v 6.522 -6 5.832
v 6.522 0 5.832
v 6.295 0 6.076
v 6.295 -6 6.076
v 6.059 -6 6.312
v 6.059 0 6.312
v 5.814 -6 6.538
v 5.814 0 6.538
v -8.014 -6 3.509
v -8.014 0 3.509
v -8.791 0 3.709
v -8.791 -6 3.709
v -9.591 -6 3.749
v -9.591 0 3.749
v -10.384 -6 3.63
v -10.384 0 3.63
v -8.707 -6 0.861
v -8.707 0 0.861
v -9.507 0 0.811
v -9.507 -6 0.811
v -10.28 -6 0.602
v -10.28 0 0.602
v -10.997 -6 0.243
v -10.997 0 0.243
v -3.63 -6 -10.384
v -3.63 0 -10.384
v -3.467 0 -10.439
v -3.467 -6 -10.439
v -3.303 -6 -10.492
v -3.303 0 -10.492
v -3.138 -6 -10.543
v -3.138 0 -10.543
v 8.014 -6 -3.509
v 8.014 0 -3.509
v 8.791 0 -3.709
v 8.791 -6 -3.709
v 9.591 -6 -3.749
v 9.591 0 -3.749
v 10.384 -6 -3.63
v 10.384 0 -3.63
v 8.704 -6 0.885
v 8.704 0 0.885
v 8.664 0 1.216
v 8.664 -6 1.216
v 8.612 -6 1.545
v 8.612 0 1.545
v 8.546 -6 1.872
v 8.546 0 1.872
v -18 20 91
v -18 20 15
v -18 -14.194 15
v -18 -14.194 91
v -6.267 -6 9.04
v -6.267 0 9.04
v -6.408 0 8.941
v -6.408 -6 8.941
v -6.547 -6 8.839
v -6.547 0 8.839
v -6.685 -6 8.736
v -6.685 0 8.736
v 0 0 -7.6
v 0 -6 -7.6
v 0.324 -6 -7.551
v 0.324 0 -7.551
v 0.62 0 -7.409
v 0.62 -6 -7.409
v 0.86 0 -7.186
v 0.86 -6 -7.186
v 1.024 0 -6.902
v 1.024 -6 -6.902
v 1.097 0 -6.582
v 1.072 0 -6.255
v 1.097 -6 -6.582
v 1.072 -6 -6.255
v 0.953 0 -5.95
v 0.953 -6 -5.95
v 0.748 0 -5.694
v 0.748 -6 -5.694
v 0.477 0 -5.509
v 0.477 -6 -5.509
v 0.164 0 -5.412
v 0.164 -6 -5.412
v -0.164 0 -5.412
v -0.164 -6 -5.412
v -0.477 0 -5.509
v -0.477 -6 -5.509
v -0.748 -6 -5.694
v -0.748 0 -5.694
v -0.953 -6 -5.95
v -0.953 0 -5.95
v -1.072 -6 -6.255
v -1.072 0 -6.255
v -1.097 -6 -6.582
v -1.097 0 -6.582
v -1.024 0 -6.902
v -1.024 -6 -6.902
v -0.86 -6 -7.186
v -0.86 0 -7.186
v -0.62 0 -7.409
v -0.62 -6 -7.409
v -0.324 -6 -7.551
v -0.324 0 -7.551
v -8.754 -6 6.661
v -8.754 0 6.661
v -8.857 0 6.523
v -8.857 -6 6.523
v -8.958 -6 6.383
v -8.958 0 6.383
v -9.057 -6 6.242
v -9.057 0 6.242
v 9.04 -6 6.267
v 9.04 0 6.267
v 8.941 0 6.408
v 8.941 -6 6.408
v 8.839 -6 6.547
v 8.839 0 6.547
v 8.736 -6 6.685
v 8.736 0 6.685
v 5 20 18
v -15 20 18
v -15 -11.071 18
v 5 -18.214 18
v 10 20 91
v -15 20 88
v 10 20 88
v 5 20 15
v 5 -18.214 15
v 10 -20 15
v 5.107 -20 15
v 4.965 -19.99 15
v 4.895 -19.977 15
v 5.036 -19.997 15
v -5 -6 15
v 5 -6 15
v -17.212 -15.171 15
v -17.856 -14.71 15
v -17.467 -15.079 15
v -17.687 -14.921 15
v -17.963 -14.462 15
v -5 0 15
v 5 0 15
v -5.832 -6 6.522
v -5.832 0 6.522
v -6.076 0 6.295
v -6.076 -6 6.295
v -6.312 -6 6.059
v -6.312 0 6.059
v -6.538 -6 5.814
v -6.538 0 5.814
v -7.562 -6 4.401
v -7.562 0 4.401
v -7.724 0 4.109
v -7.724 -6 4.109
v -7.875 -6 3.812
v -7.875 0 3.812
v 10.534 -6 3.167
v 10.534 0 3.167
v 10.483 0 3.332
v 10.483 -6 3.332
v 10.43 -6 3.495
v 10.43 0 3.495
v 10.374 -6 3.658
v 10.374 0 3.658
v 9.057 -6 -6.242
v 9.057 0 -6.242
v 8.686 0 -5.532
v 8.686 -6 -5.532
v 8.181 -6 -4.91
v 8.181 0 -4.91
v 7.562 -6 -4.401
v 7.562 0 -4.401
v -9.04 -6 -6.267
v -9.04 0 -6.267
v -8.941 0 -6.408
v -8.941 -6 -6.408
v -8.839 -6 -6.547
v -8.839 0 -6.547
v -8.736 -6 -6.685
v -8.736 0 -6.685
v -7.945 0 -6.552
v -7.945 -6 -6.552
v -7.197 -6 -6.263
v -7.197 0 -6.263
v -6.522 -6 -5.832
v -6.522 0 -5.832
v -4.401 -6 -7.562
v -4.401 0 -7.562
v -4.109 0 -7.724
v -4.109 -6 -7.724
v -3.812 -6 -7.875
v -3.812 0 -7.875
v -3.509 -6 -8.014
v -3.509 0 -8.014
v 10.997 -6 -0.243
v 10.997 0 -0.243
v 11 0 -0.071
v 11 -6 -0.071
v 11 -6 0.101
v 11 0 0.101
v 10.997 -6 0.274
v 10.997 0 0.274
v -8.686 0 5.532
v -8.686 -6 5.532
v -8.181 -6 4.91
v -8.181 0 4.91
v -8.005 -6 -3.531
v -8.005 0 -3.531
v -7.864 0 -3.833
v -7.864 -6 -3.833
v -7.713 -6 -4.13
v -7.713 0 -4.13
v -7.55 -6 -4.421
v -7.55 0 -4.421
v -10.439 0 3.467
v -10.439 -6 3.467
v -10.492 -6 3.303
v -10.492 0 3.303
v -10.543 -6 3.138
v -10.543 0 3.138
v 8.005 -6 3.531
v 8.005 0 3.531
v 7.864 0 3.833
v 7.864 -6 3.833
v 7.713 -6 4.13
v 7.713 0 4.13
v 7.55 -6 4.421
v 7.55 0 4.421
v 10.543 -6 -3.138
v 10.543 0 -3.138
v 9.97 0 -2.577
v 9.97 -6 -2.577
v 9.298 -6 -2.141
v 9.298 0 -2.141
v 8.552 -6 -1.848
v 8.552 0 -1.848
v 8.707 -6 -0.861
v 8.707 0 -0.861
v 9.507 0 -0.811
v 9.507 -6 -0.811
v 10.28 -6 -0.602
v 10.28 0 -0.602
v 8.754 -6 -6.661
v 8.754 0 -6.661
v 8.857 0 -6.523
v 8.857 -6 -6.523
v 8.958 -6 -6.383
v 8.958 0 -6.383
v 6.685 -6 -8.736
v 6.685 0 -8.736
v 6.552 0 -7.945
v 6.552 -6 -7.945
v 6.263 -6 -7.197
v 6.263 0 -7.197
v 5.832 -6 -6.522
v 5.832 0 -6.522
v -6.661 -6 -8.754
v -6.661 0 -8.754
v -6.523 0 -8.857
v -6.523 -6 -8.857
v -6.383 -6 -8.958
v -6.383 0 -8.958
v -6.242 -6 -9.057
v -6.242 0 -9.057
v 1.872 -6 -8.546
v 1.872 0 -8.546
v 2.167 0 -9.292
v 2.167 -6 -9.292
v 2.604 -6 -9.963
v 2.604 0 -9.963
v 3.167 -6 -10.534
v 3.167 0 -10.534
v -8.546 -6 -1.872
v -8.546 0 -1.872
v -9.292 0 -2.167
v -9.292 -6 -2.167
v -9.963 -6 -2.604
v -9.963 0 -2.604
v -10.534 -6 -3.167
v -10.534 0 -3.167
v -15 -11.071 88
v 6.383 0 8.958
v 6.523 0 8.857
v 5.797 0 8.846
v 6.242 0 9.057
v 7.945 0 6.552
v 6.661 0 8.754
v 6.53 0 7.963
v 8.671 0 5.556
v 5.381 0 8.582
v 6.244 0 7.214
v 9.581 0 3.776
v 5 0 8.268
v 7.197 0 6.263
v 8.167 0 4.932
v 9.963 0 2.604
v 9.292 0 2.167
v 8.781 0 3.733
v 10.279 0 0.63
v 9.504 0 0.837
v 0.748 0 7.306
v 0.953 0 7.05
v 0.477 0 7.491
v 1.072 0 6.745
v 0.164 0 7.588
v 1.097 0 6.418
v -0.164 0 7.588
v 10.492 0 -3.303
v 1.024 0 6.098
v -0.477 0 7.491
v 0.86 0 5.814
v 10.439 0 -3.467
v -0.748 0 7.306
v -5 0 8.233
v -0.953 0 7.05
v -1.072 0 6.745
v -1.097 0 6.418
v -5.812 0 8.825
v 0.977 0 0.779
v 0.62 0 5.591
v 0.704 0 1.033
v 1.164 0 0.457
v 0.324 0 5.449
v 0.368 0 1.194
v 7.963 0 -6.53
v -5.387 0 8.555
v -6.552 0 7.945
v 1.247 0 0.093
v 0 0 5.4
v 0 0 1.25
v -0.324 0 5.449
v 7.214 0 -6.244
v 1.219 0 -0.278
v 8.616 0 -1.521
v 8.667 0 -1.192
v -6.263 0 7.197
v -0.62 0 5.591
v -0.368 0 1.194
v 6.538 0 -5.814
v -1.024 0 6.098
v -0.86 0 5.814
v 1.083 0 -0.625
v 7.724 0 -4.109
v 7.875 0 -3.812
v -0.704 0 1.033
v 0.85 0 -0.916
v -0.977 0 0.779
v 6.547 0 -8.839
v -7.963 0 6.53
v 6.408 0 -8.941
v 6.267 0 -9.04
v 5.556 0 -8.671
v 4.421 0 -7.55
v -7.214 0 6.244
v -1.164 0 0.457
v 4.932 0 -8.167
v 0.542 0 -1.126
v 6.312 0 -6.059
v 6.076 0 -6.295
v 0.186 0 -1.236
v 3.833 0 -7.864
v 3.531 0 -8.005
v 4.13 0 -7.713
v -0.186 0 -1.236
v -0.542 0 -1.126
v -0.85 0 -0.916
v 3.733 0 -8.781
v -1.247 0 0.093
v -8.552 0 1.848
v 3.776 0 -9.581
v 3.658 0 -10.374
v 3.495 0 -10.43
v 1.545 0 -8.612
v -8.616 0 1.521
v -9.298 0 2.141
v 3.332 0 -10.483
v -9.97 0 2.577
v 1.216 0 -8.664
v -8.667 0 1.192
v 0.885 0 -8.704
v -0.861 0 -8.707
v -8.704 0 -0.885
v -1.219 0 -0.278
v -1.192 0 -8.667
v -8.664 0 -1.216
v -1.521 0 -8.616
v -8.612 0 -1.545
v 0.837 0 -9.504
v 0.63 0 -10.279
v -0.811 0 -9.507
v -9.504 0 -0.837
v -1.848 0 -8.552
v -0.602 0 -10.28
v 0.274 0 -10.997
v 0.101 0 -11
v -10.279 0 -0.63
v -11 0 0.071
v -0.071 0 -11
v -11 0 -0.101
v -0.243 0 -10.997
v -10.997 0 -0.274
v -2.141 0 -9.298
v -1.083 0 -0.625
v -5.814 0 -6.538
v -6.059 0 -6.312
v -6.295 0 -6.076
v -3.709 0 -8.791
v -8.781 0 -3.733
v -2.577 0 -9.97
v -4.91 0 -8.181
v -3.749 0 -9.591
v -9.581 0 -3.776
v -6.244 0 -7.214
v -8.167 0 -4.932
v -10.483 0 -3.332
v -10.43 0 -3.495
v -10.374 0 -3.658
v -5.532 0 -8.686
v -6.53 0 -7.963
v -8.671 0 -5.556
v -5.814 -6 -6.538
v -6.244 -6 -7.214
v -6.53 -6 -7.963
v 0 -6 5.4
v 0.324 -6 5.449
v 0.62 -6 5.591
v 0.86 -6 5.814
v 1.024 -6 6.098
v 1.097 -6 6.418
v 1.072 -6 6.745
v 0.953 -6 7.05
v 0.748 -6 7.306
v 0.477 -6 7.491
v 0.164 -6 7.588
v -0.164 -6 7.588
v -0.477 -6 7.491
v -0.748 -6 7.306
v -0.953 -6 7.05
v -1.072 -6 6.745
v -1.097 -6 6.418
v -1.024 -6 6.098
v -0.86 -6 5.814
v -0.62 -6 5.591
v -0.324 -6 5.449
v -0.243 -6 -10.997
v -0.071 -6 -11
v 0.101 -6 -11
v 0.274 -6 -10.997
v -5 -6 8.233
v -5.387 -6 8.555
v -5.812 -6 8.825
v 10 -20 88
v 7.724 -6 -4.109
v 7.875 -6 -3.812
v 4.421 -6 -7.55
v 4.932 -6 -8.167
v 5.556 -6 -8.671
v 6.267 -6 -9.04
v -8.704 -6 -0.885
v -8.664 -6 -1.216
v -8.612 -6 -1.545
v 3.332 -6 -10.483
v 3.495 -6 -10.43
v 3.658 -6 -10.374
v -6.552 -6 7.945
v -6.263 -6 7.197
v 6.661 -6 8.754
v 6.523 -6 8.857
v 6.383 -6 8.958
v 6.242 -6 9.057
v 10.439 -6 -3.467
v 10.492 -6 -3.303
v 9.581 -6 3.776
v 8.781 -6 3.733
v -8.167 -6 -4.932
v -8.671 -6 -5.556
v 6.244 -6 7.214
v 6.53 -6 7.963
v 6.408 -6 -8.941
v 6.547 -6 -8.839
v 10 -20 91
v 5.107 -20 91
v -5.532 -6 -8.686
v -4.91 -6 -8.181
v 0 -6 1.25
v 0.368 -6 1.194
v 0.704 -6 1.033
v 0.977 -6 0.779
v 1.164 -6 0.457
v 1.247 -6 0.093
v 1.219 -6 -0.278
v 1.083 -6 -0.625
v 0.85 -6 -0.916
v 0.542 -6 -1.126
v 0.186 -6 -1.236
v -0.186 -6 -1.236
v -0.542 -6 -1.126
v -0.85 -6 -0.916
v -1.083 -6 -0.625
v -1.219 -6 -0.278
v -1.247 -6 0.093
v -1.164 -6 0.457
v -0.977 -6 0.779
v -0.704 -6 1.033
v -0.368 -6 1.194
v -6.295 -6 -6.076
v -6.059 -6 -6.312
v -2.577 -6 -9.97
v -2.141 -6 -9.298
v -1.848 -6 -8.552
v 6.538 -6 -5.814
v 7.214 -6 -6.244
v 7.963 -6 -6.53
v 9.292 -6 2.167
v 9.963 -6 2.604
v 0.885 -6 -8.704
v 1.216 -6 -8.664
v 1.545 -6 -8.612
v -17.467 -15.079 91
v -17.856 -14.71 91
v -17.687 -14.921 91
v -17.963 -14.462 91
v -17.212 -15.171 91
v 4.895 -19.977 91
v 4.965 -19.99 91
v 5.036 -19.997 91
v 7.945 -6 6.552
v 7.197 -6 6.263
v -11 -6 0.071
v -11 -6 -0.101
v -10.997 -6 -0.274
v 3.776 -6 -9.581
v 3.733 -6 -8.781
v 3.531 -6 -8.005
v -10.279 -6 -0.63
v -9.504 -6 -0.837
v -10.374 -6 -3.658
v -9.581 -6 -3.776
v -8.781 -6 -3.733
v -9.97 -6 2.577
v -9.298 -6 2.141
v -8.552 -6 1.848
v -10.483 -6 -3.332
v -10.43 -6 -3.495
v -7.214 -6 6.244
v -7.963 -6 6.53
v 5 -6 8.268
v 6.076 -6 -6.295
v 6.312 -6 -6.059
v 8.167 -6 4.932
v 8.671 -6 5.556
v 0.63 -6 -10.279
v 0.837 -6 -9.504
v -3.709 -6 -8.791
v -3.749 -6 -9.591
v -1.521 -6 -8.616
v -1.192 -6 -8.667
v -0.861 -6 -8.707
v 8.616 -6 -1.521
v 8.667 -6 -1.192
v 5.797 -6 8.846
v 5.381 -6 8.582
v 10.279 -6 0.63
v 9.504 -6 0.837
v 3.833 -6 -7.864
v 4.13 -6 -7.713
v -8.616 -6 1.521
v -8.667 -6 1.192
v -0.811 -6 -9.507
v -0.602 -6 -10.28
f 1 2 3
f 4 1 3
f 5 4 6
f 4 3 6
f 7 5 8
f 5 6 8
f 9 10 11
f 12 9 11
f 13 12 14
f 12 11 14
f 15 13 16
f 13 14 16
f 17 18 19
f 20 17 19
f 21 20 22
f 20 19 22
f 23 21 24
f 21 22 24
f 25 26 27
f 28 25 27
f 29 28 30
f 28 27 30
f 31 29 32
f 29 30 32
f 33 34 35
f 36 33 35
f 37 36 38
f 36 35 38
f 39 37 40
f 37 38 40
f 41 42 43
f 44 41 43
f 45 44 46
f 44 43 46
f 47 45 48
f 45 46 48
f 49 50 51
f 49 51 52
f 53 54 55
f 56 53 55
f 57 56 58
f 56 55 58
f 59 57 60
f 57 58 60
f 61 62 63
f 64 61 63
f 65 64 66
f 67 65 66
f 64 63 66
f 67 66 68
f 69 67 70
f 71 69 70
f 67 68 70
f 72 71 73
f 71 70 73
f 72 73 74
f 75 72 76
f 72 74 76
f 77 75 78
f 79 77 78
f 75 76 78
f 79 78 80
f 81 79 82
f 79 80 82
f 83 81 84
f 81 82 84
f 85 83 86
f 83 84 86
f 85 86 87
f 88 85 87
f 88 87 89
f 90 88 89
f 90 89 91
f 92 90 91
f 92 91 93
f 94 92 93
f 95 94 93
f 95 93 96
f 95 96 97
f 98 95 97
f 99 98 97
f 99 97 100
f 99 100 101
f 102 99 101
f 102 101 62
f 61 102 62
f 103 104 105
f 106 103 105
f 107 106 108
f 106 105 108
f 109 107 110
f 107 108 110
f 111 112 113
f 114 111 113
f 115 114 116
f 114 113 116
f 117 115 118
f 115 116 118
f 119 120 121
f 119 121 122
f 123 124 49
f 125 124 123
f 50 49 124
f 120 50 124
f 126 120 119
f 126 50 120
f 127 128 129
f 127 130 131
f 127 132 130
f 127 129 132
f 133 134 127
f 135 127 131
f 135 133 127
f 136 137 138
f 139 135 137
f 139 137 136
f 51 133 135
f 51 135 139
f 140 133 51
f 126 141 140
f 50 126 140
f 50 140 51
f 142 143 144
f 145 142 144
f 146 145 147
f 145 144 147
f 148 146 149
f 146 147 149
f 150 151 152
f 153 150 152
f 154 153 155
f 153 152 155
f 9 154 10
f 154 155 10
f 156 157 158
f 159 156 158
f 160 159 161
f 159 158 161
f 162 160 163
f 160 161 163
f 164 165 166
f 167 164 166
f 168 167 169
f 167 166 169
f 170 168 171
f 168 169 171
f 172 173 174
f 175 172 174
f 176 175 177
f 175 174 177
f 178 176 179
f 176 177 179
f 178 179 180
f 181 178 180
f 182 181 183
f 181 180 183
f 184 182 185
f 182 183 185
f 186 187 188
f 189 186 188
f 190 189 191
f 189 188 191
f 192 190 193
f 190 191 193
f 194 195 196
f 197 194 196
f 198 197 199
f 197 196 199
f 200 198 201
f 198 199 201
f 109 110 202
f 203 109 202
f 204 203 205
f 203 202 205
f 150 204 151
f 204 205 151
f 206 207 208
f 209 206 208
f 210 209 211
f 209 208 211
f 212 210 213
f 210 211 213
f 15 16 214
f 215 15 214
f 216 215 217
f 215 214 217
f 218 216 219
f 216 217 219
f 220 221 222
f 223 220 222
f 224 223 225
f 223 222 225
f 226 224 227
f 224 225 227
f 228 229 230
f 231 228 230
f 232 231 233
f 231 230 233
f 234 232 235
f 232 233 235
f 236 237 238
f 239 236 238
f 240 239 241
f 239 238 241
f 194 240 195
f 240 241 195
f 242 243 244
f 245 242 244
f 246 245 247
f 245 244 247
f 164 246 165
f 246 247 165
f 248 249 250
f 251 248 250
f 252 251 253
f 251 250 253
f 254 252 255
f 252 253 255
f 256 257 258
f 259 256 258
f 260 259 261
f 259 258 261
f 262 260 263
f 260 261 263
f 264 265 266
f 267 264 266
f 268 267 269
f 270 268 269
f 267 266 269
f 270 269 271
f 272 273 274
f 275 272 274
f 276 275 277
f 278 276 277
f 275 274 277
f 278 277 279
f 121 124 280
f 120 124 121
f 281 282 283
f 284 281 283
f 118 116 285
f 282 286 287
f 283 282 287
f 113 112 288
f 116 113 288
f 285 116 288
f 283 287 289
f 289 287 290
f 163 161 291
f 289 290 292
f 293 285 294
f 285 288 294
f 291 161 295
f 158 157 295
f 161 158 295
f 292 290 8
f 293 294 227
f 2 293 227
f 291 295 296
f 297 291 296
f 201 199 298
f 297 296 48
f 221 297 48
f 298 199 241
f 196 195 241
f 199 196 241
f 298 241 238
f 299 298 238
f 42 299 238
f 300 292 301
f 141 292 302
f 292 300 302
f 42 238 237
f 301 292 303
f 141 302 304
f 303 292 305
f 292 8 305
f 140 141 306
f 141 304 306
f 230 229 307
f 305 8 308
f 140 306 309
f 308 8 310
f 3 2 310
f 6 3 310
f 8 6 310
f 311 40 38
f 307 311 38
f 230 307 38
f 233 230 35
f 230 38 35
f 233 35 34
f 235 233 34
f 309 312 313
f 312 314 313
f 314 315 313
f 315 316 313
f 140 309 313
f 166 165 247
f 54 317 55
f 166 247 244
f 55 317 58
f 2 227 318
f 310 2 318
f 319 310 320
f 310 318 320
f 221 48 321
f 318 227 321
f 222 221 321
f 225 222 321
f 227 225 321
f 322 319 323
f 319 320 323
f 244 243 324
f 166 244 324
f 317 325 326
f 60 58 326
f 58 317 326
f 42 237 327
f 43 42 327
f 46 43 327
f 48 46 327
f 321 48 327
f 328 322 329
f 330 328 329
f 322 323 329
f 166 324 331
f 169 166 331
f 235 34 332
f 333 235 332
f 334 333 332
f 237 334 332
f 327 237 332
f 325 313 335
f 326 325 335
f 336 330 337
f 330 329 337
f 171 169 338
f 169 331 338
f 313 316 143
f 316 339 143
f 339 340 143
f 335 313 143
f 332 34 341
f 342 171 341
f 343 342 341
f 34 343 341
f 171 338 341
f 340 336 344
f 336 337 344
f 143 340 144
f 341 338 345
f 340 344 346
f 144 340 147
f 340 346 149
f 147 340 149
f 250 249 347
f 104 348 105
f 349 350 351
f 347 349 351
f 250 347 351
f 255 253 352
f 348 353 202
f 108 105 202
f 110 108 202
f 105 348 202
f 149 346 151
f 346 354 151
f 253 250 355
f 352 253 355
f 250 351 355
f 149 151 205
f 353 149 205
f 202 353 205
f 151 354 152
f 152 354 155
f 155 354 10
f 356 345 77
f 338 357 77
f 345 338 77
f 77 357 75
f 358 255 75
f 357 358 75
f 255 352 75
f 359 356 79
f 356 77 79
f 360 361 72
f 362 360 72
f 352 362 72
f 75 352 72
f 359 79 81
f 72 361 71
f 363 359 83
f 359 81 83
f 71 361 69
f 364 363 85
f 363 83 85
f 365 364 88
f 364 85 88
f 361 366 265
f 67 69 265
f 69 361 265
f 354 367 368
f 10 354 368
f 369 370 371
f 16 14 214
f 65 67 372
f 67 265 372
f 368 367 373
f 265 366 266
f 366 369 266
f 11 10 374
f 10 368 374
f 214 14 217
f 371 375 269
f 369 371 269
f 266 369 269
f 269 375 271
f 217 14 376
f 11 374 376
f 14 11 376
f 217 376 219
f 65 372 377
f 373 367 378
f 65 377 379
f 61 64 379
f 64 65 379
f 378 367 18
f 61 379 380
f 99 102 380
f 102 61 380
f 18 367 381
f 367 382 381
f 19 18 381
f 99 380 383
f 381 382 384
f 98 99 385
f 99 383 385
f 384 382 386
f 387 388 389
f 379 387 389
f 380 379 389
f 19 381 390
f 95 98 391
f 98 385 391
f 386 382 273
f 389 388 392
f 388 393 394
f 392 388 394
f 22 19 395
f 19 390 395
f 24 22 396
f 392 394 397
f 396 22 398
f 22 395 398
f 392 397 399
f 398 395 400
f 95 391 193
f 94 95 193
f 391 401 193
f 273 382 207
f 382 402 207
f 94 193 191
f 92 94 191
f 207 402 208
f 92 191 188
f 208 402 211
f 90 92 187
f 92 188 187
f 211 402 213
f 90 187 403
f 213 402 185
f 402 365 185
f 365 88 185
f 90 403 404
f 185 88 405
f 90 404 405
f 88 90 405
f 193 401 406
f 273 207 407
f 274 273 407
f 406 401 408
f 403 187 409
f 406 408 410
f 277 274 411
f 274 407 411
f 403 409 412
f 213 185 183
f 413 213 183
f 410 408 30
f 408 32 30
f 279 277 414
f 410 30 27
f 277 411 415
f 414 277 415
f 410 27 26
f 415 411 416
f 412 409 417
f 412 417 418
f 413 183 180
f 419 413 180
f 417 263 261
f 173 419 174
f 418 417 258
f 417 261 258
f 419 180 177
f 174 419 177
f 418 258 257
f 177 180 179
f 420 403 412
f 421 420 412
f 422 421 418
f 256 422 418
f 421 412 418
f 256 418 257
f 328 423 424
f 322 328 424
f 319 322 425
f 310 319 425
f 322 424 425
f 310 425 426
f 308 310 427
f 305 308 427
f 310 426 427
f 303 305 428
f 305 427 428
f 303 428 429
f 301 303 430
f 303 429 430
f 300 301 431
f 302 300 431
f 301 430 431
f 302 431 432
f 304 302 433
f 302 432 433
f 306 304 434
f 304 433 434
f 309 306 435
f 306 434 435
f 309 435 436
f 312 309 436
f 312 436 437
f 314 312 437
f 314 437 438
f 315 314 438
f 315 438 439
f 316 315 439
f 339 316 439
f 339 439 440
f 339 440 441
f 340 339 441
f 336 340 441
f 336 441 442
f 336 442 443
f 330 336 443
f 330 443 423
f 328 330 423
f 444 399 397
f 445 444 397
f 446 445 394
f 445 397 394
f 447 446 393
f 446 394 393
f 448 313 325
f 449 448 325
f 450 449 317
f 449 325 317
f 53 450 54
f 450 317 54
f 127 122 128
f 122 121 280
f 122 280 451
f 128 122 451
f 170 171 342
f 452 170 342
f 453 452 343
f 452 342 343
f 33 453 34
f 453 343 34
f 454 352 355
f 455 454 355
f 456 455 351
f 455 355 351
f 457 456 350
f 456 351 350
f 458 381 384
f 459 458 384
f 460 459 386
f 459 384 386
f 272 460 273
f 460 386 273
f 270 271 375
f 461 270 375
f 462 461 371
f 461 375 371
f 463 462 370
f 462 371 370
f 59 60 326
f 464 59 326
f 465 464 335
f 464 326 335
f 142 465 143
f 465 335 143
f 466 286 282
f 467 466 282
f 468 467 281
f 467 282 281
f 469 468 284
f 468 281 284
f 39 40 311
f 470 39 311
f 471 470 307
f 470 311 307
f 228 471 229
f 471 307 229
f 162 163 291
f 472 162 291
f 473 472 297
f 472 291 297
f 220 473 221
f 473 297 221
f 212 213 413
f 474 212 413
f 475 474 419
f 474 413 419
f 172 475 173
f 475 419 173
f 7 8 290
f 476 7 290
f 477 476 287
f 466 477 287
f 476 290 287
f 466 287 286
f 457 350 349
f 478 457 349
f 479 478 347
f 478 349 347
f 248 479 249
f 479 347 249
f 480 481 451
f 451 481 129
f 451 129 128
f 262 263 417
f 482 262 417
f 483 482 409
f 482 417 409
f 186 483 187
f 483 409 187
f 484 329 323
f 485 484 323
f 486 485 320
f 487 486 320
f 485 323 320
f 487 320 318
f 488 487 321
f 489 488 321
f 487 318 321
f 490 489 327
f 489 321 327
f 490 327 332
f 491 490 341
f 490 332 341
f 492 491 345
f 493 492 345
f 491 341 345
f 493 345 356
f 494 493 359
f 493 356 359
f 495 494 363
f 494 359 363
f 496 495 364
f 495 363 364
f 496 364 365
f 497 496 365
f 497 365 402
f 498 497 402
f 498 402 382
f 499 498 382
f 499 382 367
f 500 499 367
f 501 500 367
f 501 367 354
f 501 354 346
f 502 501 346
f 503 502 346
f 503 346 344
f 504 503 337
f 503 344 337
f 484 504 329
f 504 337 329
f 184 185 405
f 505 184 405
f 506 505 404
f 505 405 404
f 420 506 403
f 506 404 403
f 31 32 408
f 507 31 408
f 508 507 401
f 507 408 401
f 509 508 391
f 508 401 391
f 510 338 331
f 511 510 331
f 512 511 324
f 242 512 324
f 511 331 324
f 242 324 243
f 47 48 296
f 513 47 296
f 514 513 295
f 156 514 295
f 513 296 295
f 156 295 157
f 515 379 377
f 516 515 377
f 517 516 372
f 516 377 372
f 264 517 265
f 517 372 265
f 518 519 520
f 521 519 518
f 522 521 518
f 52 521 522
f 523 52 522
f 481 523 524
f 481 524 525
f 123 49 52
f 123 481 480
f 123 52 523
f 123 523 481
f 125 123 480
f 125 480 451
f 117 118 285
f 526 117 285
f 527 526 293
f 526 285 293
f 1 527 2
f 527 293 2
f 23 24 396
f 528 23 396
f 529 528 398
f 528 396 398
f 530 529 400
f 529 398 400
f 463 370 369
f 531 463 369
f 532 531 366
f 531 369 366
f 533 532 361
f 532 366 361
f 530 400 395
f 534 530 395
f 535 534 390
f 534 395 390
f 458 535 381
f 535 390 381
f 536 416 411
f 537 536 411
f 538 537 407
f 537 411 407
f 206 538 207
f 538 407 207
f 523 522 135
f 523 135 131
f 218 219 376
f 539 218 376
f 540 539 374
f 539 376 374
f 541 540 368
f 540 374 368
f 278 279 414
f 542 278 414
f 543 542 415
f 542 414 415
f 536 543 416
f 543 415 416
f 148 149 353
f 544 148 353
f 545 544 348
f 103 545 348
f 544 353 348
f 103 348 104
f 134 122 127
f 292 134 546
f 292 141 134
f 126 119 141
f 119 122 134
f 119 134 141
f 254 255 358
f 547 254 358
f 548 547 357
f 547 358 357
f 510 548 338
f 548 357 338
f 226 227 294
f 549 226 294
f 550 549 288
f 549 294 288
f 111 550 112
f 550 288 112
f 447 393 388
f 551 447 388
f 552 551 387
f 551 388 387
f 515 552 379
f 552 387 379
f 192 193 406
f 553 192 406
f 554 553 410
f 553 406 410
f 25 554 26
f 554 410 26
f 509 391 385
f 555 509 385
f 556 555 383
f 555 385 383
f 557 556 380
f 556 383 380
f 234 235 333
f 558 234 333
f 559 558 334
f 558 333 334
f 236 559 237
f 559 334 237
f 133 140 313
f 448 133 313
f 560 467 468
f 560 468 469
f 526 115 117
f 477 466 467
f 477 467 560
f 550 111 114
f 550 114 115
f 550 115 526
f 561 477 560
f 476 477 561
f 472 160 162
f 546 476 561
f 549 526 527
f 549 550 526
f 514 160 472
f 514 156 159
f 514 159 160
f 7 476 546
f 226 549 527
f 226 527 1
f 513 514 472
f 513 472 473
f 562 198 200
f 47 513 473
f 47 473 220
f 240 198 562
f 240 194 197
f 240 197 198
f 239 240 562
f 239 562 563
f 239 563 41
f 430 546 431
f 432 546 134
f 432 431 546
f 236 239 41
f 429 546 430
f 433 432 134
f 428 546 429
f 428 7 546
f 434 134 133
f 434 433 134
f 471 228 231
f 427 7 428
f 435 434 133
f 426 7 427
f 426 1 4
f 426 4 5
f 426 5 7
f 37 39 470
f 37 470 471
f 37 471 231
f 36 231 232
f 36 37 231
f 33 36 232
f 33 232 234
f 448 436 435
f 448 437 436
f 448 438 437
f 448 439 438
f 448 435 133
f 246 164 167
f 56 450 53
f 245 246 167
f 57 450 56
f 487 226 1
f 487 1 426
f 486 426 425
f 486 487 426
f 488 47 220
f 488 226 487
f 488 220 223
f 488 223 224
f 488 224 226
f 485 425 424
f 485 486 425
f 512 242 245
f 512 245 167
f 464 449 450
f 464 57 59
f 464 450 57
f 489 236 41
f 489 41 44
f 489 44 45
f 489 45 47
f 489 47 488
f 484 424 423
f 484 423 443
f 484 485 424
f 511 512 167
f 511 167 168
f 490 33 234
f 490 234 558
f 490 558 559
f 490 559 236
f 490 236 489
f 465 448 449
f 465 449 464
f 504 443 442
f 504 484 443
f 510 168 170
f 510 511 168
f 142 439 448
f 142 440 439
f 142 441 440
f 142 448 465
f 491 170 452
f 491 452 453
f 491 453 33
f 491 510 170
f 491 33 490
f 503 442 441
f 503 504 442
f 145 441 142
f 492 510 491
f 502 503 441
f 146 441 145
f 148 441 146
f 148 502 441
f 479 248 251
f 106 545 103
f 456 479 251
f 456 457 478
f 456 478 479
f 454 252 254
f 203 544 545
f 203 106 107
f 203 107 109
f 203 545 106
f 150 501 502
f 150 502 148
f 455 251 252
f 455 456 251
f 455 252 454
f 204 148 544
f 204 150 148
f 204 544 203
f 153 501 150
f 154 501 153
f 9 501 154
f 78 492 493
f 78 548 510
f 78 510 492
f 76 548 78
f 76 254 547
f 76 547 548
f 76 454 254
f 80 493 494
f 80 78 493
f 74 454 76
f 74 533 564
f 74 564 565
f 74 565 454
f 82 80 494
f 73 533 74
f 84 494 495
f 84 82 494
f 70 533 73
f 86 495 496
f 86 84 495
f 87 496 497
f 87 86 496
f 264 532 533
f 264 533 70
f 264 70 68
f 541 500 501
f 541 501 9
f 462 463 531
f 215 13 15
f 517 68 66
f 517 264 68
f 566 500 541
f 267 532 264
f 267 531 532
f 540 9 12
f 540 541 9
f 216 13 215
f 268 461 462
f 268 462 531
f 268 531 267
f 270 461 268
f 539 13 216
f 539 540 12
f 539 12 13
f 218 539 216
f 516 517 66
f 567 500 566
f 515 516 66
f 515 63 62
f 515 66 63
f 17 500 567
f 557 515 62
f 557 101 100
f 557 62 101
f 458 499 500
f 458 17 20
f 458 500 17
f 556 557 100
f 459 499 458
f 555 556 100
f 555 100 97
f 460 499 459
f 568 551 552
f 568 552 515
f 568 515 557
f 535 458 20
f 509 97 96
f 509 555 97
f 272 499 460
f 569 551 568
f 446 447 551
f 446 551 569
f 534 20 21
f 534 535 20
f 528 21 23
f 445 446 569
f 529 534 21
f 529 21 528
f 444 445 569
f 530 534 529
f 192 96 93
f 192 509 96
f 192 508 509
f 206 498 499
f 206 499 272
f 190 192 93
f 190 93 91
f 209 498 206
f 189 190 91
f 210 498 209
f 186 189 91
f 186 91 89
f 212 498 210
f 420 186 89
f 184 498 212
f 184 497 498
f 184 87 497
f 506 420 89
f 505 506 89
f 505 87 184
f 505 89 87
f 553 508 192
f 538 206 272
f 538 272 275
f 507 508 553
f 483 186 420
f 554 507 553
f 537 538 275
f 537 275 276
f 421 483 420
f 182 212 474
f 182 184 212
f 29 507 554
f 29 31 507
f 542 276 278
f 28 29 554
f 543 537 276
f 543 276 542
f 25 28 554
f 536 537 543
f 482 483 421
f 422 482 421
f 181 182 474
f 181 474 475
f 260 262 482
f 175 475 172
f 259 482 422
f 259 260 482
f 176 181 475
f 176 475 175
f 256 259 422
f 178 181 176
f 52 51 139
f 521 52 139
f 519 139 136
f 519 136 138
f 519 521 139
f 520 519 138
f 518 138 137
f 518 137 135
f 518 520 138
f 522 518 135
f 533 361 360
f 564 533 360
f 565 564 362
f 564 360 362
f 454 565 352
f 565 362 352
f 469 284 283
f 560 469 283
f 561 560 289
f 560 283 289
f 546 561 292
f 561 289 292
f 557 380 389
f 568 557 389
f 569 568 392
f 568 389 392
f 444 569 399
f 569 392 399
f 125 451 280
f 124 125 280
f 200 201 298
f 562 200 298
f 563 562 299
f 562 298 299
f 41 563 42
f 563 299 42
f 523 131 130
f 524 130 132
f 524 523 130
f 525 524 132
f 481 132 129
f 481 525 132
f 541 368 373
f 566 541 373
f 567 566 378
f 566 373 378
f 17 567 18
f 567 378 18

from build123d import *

# Parameters (mm, degrees)
SKETCH_1_R          = 1.25
EXTRUDE_1_DEPTH     = 6
EXTRUDE_2_DEPTH     = 20
EXTRUDE_START       = -6
SKETCH_4_R          = 1.25
EXTRUDE_4_DEPTH     = 6
SKETCH_5_R          = 1.1
CUT_EXTRUDE_1_DEPTH = 97.337946833
EXTRUDE_5_DEPTH     = 76
CUT_EXTRUDE_2_DEPTH = 76


with BuildPart() as part:
    # 草图1 → 凸台-拉伸1 (new body)
    with BuildSketch(Plane(origin=(0, 0, 0), x_dir=(1, 0, 0), z_dir=(0, 1, 0))):
        with BuildLine():
            Line((5, 0), (5, -18))
            Line((5, -18), (-15, -18))
            Line((-15, -18), (-15, -88))
            Line((-15, -88), (10, -88))
            Line((10, -88), (10, -91))
            Line((10, -91), (-18, -91))
            Line((-18, -91), (-18, -15))
            Line((-18, -15), (-5, -15))
            Line((-5, -15), (-5, 0))
            ThreePointArc((-5, 0), (0, 5), (5, 0))
        make_face()
        with Locations(Location((0, 0, 0), (0, 0, 270))):
            Circle(SKETCH_1_R, mode=Mode.SUBTRACT)
    extrude(amount=-EXTRUDE_1_DEPTH)

    # 草图2 → 凸台-拉伸2 (add, symmetric)
    with BuildSketch(Plane(origin=(0, 0, 0), x_dir=(1, 0, 0), z_dir=(0, 1, 0))):
        Polygon((-15, -18), (5, -18), (5, -15), (-18, -15), (-18, -91), (10, -91), (10, -88), (-15, -88), align=None)
    extrude(amount=EXTRUDE_2_DEPTH, both=True)

    # 草图4 → 凸台-拉伸4 (add)
    with BuildSketch(Plane.XZ.offset(6).offset(EXTRUDE_START)):
        with BuildLine():
            ThreePointArc((0.860680542, 8.706562468), (0.72579344, 9.898750182), (0.24342364, 10.997306258))
            ThreePointArc((0.24342364, 10.997306258), (-0.01511058, 10.999989621), (-0.273636452, 10.996595977))
            ThreePointArc((-0.273636452, 10.996595977), (-0.752986286, 9.896718796), (-0.884597491, 8.704164996))
            ThreePointArc((-0.884597491, 8.704164996), (-1.380514283, 8.639397046), (-1.871919927, 8.546397884))
            ThreePointArc((-1.871919927, 8.546397884), (-2.368611449, 9.638553371), (-3.166844887, 10.53428182))
            ThreePointArc((-3.166844887, 10.53428182), (-3.413554747, 10.456942383), (-3.658378768, 10.373825947))
            ThreePointArc((-3.658378768, 10.373825947), (-3.77438681, 9.179653342), (-3.531037114, 8.00479718))
            ThreePointArc((-3.531037114, 8.00479718), (-3.982667613, 7.789952483), (-4.421283831, 7.549652329))
            ThreePointArc((-4.421283831, 7.549652329), (-5.231160146, 8.434867801), (-6.267120572, 9.040088481))
            ThreePointArc((-6.267120572, 9.040088481), (-6.477856391, 8.890296766), (-6.685013481, 8.735593555))
            ThreePointArc((-6.685013481, 8.735593555), (-6.426324056, 7.564019461), (-5.831834222, 6.521864044))
            ThreePointArc((-5.831834222, 6.521864044), (-6.194969688, 6.177973095), (-6.537861669, 5.813894202))
            ThreePointArc((-6.537861669, 5.813894202), (-7.58164644, 6.405518601), (-8.753926829, 6.660988295))
            ThreePointArc((-8.753926829, 6.660988295), (-8.908060318, 6.453406959), (-9.057272497, 6.242260401))
            ThreePointArc((-9.057272497, 6.242260401), (-8.449207929, 5.207966653), (-7.561770763, 4.400525414))
            ThreePointArc((-7.561770763, 4.400525414), (-7.800864967, 3.961250657), (-8.014468055, 3.509031603))
            ThreePointArc((-8.014468055, 3.509031603), (-9.189988356, 3.74915261), (-10.383837737, 3.629864165))
            ThreePointArc((-10.383837737, 3.629864165), (-10.466281235, 3.384812715), (-10.542942575, 3.137891306))
            ThreePointArc((-10.542942575, 3.137891306), (-9.64502446, 2.342121783), (-8.551508496, 1.848432697))
            ThreePointArc((-8.551508496, 1.848432697), (-8.643157232, 1.356773404), (-8.706562468, 0.860680542))
            ThreePointArc((-8.706562468, 0.860680542), (-9.898750182, 0.72579344), (-10.997306258, 0.24342364))
            ThreePointArc((-10.997306258, 0.24342364), (-10.999989621, -0.01511058), (-10.996595977, -0.273636452))
            ThreePointArc((-10.996595977, -0.273636452), (-9.896718796, -0.752986286), (-8.704164996, -0.884597491))
            ThreePointArc((-8.704164996, -0.884597491), (-8.639397046, -1.380514283), (-8.546397884, -1.871919927))
            ThreePointArc((-8.546397884, -1.871919927), (-9.638553371, -2.368611449), (-10.53428182, -3.166844887))
            ThreePointArc((-10.53428182, -3.166844887), (-10.456942383, -3.413554747), (-10.373825947, -3.658378768))
            ThreePointArc((-10.373825947, -3.658378768), (-9.179653342, -3.77438681), (-8.00479718, -3.531037114))
            ThreePointArc((-8.00479718, -3.531037114), (-7.789952483, -3.982667613), (-7.549652329, -4.421283831))
            ThreePointArc((-7.549652329, -4.421283831), (-8.434867801, -5.231160146), (-9.040088481, -6.267120572))
            ThreePointArc((-9.040088481, -6.267120572), (-8.890296766, -6.477856391), (-8.735593555, -6.685013481))
            ThreePointArc((-8.735593555, -6.685013481), (-7.564019461, -6.426324056), (-6.521864044, -5.831834222))
            ThreePointArc((-6.521864044, -5.831834222), (-6.177973095, -6.194969688), (-5.813894202, -6.537861669))
            ThreePointArc((-5.813894202, -6.537861669), (-6.405518601, -7.58164644), (-6.660988295, -8.753926829))
            ThreePointArc((-6.660988295, -8.753926829), (-6.453406959, -8.908060318), (-6.242260401, -9.057272497))
            ThreePointArc((-6.242260401, -9.057272497), (-5.207966653, -8.449207929), (-4.400525414, -7.561770763))
            ThreePointArc((-4.400525414, -7.561770763), (-3.961250657, -7.800864967), (-3.509031603, -8.014468055))
            ThreePointArc((-3.509031603, -8.014468055), (-3.74915261, -9.189988356), (-3.629864165, -10.383837737))
            ThreePointArc((-3.629864165, -10.383837737), (-3.384812715, -10.466281235), (-3.137891306, -10.542942575))
            ThreePointArc((-3.137891306, -10.542942575), (-2.342121783, -9.64502446), (-1.848432697, -8.551508496))
            ThreePointArc((-1.848432697, -8.551508496), (-1.356773404, -8.643157232), (-0.860680542, -8.706562468))
            ThreePointArc((-0.860680542, -8.706562468), (-0.72579344, -9.898750182), (-0.24342364, -10.997306258))
            ThreePointArc((-0.24342364, -10.997306258), (0.01511058, -10.999989621), (0.273636452, -10.996595977))
            ThreePointArc((0.273636452, -10.996595977), (0.752986286, -9.896718796), (0.884597491, -8.704164996))
            ThreePointArc((0.884597491, -8.704164996), (1.380514283, -8.639397046), (1.871919927, -8.546397884))
            ThreePointArc((1.871919927, -8.546397884), (2.368611449, -9.638553371), (3.166844887, -10.53428182))
            ThreePointArc((3.166844887, -10.53428182), (3.413554747, -10.456942383), (3.658378768, -10.373825947))
            ThreePointArc((3.658378768, -10.373825947), (3.77438681, -9.179653342), (3.531037114, -8.00479718))
            ThreePointArc((3.531037114, -8.00479718), (3.982667613, -7.789952483), (4.421283831, -7.549652329))
            ThreePointArc((4.421283831, -7.549652329), (5.231160146, -8.434867801), (6.267120572, -9.040088481))
            ThreePointArc((6.267120572, -9.040088481), (6.477856391, -8.890296766), (6.685013481, -8.735593555))
            ThreePointArc((6.685013481, -8.735593555), (6.426324056, -7.564019461), (5.831834222, -6.521864044))
            ThreePointArc((5.831834222, -6.521864044), (6.194969688, -6.177973095), (6.537861669, -5.813894202))
            ThreePointArc((6.537861669, -5.813894202), (7.58164644, -6.405518601), (8.753926829, -6.660988295))
            ThreePointArc((8.753926829, -6.660988295), (8.908060318, -6.453406959), (9.057272497, -6.242260401))
            ThreePointArc((9.057272497, -6.242260401), (8.449207929, -5.207966653), (7.561770763, -4.400525414))
            ThreePointArc((7.561770763, -4.400525414), (7.800864967, -3.961250657), (8.014468055, -3.509031603))
            ThreePointArc((8.014468055, -3.509031603), (9.189988356, -3.74915261), (10.383837737, -3.629864165))
            ThreePointArc((10.383837737, -3.629864165), (10.466281235, -3.384812715), (10.542942575, -3.137891306))
            ThreePointArc((10.542942575, -3.137891306), (9.64502446, -2.342121783), (8.551508496, -1.848432697))
            ThreePointArc((8.551508496, -1.848432697), (8.643157232, -1.356773404), (8.706562468, -0.860680542))
            ThreePointArc((8.706562468, -0.860680542), (9.898750182, -0.72579344), (10.997306258, -0.24342364))
            ThreePointArc((10.997306258, -0.24342364), (10.999989621, 0.01511058), (10.996595977, 0.273636452))
            ThreePointArc((10.996595977, 0.273636452), (9.896718796, 0.752986286), (8.704164996, 0.884597491))
            ThreePointArc((8.704164996, 0.884597491), (8.639397046, 1.380514283), (8.546397884, 1.871919927))
            ThreePointArc((8.546397884, 1.871919927), (9.638553371, 2.368611449), (10.53428182, 3.166844887))
            ThreePointArc((10.53428182, 3.166844887), (10.456942383, 3.413554747), (10.373825947, 3.658378768))
            ThreePointArc((10.373825947, 3.658378768), (9.179653342, 3.77438681), (8.00479718, 3.531037114))
            ThreePointArc((8.00479718, 3.531037114), (7.789952483, 3.982667613), (7.549652329, 4.421283831))
            ThreePointArc((7.549652329, 4.421283831), (8.434867801, 5.231160146), (9.040088481, 6.267120572))
            ThreePointArc((9.040088481, 6.267120572), (8.890296766, 6.477856391), (8.735593555, 6.685013481))
            ThreePointArc((8.735593555, 6.685013481), (7.564019461, 6.426324056), (6.521864044, 5.831834222))
            ThreePointArc((6.521864044, 5.831834222), (6.177973095, 6.194969688), (5.813894202, 6.537861669))
            ThreePointArc((5.813894202, 6.537861669), (6.405518601, 7.58164644), (6.660988295, 8.753926829))
            ThreePointArc((6.660988295, 8.753926829), (6.453406959, 8.908060318), (6.242260401, 9.057272497))
            ThreePointArc((6.242260401, 9.057272497), (5.207966653, 8.449207929), (4.400525414, 7.561770763))
            ThreePointArc((4.400525414, 7.561770763), (3.961250657, 7.800864967), (3.509031603, 8.014468055))
            ThreePointArc((3.509031603, 8.014468055), (3.74915261, 9.189988356), (3.629864165, 10.383837737))
            ThreePointArc((3.629864165, 10.383837737), (3.384812715, 10.466281235), (3.137891306, 10.542942575))
            ThreePointArc((3.137891306, 10.542942575), (2.342121783, 9.64502446), (1.848432697, 8.551508496))
            ThreePointArc((1.848432697, 8.551508496), (1.356773404, 8.643157232), (0.860680542, 8.706562468))
        make_face()
        with Locations(Location((0, 0, 0), (0, 0, 90))):
            Circle(SKETCH_4_R, mode=Mode.SUBTRACT)
    extrude(amount=EXTRUDE_4_DEPTH)

    # 草图5 → 切除-拉伸1 (cut, through all)
    with BuildSketch(Plane.XZ.offset(6)):
        with Locations(Location((0, 6.5, 0), (0, 0, 270))):
            Circle(SKETCH_5_R)
        with Locations(Location((0, -6.5, 0), (0, 0, 270))):
            Circle(SKETCH_5_R)
    extrude(amount=-CUT_EXTRUDE_1_DEPTH, mode=Mode.SUBTRACT)

    # 草图6 → 凸台-拉伸5 (add)
    with BuildSketch(Plane.XY.offset(91)):
        Polygon((-18, -10), (10, -20), (-18, -20), align=None)
    extrude(amount=-EXTRUDE_5_DEPTH)

    # 草图8 → 切除-拉伸2 (cut)
    with BuildSketch(Plane.XY.offset(91)):
        with BuildLine():
            Line((-17.212429644, -15.171210947), (4.895011274, -19.977176364))
            ThreePointArc((4.895011274, -19.977176364), (5.000614807, -19.994277719), (5.107440918, -20))
            Line((5.107440918, -20), (5.107440918, -20.306754101))
            Line((5.107440918, -20.306754101), (-18, -20.306754101))
            Line((-18, -20.306754101), (-18, -19.977176364))
            Line((-18, -19.977176364), (-18, -14.194034583))
            ThreePointArc((-18, -14.194034583), (-17.778597985, -14.821557633), (-17.212429644, -15.171210947))
        make_face()
    extrude(amount=-CUT_EXTRUDE_2_DEPTH, mode=Mode.SUBTRACT)


solid = part.part
